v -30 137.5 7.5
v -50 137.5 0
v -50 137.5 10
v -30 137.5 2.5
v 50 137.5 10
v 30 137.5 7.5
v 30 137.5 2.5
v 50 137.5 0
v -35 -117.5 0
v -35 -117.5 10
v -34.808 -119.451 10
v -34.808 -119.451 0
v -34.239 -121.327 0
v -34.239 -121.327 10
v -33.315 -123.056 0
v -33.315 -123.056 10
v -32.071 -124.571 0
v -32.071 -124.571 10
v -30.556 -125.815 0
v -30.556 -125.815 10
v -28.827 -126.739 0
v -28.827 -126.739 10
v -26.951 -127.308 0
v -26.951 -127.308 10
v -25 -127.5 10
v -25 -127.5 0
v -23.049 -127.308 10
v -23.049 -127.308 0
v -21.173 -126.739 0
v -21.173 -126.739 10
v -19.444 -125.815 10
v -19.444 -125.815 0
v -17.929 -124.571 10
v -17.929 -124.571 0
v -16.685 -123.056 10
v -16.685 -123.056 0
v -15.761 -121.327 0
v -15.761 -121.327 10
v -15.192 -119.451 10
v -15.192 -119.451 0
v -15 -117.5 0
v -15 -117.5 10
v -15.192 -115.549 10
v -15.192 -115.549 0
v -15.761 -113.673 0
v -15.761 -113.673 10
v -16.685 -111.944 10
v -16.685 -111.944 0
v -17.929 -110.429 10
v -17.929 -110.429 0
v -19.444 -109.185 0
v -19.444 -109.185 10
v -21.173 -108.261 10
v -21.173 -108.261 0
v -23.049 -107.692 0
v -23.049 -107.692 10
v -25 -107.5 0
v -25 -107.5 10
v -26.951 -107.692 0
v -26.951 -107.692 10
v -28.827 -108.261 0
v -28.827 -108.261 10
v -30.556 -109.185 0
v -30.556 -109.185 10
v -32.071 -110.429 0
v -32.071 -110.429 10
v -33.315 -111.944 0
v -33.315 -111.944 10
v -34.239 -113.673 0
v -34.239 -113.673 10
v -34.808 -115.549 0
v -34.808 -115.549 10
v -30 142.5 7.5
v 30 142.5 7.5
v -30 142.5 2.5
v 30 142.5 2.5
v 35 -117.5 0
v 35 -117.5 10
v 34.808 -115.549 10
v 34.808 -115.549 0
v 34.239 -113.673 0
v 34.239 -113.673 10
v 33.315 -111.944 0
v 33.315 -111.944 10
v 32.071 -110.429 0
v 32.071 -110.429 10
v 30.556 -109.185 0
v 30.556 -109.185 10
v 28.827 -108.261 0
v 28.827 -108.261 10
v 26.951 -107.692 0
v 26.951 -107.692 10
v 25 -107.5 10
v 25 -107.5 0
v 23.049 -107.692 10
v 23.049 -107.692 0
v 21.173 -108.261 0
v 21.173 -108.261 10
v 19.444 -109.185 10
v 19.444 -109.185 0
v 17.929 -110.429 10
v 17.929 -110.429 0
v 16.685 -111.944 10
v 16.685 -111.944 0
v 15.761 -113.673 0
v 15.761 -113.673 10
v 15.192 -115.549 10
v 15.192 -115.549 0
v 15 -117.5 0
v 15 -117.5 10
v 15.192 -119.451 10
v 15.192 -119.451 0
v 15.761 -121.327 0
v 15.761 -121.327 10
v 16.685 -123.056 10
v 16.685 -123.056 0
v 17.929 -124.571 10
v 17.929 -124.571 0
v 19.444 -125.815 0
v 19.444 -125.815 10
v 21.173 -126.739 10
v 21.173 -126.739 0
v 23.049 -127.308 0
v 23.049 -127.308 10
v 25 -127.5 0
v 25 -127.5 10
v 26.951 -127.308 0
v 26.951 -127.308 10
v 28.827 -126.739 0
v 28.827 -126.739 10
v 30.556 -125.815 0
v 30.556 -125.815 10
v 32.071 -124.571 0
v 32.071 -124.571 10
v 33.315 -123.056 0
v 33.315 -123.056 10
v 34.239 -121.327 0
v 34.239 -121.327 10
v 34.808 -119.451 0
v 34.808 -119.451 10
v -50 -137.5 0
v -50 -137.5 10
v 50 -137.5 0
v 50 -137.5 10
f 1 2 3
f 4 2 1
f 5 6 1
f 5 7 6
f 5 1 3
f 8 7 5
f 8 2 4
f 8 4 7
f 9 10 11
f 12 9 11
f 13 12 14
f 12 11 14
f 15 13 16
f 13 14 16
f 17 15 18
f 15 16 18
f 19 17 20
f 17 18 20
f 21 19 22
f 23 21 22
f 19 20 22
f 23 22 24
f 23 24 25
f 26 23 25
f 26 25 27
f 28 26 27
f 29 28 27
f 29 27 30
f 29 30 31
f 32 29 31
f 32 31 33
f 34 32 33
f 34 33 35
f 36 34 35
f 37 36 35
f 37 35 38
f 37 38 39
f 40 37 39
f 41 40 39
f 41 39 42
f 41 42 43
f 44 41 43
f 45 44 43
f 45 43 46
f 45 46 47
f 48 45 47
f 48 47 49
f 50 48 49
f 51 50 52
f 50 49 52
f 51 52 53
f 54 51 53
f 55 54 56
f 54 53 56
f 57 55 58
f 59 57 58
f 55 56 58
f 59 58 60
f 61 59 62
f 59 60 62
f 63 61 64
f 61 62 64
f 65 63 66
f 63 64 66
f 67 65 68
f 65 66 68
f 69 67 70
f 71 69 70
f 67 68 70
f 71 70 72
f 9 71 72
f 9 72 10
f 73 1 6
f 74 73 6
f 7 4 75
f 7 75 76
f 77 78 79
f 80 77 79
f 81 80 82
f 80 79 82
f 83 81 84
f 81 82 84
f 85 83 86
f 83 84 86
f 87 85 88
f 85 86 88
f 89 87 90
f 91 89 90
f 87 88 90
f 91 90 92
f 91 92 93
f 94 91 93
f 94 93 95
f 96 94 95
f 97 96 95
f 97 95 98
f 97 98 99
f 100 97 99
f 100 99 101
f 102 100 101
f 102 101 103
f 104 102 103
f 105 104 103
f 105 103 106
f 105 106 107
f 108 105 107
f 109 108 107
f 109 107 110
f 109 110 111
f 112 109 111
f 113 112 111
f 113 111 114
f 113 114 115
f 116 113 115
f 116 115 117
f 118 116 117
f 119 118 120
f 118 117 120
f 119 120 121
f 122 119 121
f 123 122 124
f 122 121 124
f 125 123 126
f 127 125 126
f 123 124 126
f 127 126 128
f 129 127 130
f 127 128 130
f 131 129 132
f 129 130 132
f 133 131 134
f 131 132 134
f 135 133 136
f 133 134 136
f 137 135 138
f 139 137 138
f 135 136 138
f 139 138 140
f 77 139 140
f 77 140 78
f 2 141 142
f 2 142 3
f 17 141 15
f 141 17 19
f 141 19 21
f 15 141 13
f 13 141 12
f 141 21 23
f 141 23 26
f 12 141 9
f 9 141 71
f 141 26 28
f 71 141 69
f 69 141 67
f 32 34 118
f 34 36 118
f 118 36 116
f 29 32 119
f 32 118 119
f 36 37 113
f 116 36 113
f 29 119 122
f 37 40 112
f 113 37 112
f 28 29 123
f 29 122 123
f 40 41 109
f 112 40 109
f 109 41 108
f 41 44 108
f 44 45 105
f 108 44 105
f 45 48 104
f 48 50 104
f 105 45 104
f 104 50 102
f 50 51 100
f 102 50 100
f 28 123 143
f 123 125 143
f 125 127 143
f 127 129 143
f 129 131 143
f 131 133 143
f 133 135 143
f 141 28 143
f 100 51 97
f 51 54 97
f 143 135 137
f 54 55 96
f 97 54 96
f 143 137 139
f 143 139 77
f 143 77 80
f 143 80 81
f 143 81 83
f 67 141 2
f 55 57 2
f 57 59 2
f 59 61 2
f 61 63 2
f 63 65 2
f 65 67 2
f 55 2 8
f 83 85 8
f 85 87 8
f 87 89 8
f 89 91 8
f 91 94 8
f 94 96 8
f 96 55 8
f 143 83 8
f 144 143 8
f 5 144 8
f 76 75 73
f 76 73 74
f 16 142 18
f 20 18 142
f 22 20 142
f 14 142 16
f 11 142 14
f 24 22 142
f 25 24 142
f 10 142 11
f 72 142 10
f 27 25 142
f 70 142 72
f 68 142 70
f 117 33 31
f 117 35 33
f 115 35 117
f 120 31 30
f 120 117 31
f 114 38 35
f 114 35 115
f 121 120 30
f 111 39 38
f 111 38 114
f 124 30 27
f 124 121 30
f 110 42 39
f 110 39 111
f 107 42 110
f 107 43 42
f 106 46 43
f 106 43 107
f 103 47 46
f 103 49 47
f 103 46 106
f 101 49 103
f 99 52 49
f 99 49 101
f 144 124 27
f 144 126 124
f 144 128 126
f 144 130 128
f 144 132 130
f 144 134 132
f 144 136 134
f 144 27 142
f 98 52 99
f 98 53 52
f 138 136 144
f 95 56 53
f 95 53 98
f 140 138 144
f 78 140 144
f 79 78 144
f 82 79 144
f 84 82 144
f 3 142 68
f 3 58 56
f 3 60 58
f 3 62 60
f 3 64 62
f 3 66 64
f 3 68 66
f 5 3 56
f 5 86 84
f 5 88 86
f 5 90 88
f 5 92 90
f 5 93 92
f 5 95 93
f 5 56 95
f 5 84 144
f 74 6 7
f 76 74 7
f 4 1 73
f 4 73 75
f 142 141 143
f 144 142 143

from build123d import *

# Parameters (mm, degrees)
SKETCH1_W           = 100
SKETCH1_H           = 275
BOSS_EXTRUDE1_DEPTH = 10
SKETCH2_W           = 60
SKETCH2_H           = 5
BOSS_EXTRUDE2_DEPTH = 5
SKETCH3_R           = 10
CUT_EXTRUDE1_DEPTH  = 152.348108677


with BuildPart() as part:
    # Sketch1 → Boss-Extrude1 (new body)
    with BuildSketch(Plane.XY):
        Rectangle(SKETCH1_W, SKETCH1_H)
    extrude(amount=BOSS_EXTRUDE1_DEPTH)

    # Sketch2 → Boss-Extrude2 (add)
    with BuildSketch(Plane(origin=(0, 137.5, 0), x_dir=(1, 0, 0), z_dir=(0, 1, 0))):
        with Locations((0, -5)):
            Rectangle(SKETCH2_W, SKETCH2_H)
    extrude(amount=BOSS_EXTRUDE2_DEPTH)

    # Sketch3 → Cut-Extrude1 (cut, through all)
    with BuildSketch(Plane.XY.offset(10)):
        with Locations((25, -117.5)):
            Circle(SKETCH3_R)
        with Locations(Location((-25, -117.5, 0), (0, 0, 180))):
            Circle(SKETCH3_R)
    extrude(amount=-CUT_EXTRUDE1_DEPTH, mode=Mode.SUBTRACT)


solid = part.part
